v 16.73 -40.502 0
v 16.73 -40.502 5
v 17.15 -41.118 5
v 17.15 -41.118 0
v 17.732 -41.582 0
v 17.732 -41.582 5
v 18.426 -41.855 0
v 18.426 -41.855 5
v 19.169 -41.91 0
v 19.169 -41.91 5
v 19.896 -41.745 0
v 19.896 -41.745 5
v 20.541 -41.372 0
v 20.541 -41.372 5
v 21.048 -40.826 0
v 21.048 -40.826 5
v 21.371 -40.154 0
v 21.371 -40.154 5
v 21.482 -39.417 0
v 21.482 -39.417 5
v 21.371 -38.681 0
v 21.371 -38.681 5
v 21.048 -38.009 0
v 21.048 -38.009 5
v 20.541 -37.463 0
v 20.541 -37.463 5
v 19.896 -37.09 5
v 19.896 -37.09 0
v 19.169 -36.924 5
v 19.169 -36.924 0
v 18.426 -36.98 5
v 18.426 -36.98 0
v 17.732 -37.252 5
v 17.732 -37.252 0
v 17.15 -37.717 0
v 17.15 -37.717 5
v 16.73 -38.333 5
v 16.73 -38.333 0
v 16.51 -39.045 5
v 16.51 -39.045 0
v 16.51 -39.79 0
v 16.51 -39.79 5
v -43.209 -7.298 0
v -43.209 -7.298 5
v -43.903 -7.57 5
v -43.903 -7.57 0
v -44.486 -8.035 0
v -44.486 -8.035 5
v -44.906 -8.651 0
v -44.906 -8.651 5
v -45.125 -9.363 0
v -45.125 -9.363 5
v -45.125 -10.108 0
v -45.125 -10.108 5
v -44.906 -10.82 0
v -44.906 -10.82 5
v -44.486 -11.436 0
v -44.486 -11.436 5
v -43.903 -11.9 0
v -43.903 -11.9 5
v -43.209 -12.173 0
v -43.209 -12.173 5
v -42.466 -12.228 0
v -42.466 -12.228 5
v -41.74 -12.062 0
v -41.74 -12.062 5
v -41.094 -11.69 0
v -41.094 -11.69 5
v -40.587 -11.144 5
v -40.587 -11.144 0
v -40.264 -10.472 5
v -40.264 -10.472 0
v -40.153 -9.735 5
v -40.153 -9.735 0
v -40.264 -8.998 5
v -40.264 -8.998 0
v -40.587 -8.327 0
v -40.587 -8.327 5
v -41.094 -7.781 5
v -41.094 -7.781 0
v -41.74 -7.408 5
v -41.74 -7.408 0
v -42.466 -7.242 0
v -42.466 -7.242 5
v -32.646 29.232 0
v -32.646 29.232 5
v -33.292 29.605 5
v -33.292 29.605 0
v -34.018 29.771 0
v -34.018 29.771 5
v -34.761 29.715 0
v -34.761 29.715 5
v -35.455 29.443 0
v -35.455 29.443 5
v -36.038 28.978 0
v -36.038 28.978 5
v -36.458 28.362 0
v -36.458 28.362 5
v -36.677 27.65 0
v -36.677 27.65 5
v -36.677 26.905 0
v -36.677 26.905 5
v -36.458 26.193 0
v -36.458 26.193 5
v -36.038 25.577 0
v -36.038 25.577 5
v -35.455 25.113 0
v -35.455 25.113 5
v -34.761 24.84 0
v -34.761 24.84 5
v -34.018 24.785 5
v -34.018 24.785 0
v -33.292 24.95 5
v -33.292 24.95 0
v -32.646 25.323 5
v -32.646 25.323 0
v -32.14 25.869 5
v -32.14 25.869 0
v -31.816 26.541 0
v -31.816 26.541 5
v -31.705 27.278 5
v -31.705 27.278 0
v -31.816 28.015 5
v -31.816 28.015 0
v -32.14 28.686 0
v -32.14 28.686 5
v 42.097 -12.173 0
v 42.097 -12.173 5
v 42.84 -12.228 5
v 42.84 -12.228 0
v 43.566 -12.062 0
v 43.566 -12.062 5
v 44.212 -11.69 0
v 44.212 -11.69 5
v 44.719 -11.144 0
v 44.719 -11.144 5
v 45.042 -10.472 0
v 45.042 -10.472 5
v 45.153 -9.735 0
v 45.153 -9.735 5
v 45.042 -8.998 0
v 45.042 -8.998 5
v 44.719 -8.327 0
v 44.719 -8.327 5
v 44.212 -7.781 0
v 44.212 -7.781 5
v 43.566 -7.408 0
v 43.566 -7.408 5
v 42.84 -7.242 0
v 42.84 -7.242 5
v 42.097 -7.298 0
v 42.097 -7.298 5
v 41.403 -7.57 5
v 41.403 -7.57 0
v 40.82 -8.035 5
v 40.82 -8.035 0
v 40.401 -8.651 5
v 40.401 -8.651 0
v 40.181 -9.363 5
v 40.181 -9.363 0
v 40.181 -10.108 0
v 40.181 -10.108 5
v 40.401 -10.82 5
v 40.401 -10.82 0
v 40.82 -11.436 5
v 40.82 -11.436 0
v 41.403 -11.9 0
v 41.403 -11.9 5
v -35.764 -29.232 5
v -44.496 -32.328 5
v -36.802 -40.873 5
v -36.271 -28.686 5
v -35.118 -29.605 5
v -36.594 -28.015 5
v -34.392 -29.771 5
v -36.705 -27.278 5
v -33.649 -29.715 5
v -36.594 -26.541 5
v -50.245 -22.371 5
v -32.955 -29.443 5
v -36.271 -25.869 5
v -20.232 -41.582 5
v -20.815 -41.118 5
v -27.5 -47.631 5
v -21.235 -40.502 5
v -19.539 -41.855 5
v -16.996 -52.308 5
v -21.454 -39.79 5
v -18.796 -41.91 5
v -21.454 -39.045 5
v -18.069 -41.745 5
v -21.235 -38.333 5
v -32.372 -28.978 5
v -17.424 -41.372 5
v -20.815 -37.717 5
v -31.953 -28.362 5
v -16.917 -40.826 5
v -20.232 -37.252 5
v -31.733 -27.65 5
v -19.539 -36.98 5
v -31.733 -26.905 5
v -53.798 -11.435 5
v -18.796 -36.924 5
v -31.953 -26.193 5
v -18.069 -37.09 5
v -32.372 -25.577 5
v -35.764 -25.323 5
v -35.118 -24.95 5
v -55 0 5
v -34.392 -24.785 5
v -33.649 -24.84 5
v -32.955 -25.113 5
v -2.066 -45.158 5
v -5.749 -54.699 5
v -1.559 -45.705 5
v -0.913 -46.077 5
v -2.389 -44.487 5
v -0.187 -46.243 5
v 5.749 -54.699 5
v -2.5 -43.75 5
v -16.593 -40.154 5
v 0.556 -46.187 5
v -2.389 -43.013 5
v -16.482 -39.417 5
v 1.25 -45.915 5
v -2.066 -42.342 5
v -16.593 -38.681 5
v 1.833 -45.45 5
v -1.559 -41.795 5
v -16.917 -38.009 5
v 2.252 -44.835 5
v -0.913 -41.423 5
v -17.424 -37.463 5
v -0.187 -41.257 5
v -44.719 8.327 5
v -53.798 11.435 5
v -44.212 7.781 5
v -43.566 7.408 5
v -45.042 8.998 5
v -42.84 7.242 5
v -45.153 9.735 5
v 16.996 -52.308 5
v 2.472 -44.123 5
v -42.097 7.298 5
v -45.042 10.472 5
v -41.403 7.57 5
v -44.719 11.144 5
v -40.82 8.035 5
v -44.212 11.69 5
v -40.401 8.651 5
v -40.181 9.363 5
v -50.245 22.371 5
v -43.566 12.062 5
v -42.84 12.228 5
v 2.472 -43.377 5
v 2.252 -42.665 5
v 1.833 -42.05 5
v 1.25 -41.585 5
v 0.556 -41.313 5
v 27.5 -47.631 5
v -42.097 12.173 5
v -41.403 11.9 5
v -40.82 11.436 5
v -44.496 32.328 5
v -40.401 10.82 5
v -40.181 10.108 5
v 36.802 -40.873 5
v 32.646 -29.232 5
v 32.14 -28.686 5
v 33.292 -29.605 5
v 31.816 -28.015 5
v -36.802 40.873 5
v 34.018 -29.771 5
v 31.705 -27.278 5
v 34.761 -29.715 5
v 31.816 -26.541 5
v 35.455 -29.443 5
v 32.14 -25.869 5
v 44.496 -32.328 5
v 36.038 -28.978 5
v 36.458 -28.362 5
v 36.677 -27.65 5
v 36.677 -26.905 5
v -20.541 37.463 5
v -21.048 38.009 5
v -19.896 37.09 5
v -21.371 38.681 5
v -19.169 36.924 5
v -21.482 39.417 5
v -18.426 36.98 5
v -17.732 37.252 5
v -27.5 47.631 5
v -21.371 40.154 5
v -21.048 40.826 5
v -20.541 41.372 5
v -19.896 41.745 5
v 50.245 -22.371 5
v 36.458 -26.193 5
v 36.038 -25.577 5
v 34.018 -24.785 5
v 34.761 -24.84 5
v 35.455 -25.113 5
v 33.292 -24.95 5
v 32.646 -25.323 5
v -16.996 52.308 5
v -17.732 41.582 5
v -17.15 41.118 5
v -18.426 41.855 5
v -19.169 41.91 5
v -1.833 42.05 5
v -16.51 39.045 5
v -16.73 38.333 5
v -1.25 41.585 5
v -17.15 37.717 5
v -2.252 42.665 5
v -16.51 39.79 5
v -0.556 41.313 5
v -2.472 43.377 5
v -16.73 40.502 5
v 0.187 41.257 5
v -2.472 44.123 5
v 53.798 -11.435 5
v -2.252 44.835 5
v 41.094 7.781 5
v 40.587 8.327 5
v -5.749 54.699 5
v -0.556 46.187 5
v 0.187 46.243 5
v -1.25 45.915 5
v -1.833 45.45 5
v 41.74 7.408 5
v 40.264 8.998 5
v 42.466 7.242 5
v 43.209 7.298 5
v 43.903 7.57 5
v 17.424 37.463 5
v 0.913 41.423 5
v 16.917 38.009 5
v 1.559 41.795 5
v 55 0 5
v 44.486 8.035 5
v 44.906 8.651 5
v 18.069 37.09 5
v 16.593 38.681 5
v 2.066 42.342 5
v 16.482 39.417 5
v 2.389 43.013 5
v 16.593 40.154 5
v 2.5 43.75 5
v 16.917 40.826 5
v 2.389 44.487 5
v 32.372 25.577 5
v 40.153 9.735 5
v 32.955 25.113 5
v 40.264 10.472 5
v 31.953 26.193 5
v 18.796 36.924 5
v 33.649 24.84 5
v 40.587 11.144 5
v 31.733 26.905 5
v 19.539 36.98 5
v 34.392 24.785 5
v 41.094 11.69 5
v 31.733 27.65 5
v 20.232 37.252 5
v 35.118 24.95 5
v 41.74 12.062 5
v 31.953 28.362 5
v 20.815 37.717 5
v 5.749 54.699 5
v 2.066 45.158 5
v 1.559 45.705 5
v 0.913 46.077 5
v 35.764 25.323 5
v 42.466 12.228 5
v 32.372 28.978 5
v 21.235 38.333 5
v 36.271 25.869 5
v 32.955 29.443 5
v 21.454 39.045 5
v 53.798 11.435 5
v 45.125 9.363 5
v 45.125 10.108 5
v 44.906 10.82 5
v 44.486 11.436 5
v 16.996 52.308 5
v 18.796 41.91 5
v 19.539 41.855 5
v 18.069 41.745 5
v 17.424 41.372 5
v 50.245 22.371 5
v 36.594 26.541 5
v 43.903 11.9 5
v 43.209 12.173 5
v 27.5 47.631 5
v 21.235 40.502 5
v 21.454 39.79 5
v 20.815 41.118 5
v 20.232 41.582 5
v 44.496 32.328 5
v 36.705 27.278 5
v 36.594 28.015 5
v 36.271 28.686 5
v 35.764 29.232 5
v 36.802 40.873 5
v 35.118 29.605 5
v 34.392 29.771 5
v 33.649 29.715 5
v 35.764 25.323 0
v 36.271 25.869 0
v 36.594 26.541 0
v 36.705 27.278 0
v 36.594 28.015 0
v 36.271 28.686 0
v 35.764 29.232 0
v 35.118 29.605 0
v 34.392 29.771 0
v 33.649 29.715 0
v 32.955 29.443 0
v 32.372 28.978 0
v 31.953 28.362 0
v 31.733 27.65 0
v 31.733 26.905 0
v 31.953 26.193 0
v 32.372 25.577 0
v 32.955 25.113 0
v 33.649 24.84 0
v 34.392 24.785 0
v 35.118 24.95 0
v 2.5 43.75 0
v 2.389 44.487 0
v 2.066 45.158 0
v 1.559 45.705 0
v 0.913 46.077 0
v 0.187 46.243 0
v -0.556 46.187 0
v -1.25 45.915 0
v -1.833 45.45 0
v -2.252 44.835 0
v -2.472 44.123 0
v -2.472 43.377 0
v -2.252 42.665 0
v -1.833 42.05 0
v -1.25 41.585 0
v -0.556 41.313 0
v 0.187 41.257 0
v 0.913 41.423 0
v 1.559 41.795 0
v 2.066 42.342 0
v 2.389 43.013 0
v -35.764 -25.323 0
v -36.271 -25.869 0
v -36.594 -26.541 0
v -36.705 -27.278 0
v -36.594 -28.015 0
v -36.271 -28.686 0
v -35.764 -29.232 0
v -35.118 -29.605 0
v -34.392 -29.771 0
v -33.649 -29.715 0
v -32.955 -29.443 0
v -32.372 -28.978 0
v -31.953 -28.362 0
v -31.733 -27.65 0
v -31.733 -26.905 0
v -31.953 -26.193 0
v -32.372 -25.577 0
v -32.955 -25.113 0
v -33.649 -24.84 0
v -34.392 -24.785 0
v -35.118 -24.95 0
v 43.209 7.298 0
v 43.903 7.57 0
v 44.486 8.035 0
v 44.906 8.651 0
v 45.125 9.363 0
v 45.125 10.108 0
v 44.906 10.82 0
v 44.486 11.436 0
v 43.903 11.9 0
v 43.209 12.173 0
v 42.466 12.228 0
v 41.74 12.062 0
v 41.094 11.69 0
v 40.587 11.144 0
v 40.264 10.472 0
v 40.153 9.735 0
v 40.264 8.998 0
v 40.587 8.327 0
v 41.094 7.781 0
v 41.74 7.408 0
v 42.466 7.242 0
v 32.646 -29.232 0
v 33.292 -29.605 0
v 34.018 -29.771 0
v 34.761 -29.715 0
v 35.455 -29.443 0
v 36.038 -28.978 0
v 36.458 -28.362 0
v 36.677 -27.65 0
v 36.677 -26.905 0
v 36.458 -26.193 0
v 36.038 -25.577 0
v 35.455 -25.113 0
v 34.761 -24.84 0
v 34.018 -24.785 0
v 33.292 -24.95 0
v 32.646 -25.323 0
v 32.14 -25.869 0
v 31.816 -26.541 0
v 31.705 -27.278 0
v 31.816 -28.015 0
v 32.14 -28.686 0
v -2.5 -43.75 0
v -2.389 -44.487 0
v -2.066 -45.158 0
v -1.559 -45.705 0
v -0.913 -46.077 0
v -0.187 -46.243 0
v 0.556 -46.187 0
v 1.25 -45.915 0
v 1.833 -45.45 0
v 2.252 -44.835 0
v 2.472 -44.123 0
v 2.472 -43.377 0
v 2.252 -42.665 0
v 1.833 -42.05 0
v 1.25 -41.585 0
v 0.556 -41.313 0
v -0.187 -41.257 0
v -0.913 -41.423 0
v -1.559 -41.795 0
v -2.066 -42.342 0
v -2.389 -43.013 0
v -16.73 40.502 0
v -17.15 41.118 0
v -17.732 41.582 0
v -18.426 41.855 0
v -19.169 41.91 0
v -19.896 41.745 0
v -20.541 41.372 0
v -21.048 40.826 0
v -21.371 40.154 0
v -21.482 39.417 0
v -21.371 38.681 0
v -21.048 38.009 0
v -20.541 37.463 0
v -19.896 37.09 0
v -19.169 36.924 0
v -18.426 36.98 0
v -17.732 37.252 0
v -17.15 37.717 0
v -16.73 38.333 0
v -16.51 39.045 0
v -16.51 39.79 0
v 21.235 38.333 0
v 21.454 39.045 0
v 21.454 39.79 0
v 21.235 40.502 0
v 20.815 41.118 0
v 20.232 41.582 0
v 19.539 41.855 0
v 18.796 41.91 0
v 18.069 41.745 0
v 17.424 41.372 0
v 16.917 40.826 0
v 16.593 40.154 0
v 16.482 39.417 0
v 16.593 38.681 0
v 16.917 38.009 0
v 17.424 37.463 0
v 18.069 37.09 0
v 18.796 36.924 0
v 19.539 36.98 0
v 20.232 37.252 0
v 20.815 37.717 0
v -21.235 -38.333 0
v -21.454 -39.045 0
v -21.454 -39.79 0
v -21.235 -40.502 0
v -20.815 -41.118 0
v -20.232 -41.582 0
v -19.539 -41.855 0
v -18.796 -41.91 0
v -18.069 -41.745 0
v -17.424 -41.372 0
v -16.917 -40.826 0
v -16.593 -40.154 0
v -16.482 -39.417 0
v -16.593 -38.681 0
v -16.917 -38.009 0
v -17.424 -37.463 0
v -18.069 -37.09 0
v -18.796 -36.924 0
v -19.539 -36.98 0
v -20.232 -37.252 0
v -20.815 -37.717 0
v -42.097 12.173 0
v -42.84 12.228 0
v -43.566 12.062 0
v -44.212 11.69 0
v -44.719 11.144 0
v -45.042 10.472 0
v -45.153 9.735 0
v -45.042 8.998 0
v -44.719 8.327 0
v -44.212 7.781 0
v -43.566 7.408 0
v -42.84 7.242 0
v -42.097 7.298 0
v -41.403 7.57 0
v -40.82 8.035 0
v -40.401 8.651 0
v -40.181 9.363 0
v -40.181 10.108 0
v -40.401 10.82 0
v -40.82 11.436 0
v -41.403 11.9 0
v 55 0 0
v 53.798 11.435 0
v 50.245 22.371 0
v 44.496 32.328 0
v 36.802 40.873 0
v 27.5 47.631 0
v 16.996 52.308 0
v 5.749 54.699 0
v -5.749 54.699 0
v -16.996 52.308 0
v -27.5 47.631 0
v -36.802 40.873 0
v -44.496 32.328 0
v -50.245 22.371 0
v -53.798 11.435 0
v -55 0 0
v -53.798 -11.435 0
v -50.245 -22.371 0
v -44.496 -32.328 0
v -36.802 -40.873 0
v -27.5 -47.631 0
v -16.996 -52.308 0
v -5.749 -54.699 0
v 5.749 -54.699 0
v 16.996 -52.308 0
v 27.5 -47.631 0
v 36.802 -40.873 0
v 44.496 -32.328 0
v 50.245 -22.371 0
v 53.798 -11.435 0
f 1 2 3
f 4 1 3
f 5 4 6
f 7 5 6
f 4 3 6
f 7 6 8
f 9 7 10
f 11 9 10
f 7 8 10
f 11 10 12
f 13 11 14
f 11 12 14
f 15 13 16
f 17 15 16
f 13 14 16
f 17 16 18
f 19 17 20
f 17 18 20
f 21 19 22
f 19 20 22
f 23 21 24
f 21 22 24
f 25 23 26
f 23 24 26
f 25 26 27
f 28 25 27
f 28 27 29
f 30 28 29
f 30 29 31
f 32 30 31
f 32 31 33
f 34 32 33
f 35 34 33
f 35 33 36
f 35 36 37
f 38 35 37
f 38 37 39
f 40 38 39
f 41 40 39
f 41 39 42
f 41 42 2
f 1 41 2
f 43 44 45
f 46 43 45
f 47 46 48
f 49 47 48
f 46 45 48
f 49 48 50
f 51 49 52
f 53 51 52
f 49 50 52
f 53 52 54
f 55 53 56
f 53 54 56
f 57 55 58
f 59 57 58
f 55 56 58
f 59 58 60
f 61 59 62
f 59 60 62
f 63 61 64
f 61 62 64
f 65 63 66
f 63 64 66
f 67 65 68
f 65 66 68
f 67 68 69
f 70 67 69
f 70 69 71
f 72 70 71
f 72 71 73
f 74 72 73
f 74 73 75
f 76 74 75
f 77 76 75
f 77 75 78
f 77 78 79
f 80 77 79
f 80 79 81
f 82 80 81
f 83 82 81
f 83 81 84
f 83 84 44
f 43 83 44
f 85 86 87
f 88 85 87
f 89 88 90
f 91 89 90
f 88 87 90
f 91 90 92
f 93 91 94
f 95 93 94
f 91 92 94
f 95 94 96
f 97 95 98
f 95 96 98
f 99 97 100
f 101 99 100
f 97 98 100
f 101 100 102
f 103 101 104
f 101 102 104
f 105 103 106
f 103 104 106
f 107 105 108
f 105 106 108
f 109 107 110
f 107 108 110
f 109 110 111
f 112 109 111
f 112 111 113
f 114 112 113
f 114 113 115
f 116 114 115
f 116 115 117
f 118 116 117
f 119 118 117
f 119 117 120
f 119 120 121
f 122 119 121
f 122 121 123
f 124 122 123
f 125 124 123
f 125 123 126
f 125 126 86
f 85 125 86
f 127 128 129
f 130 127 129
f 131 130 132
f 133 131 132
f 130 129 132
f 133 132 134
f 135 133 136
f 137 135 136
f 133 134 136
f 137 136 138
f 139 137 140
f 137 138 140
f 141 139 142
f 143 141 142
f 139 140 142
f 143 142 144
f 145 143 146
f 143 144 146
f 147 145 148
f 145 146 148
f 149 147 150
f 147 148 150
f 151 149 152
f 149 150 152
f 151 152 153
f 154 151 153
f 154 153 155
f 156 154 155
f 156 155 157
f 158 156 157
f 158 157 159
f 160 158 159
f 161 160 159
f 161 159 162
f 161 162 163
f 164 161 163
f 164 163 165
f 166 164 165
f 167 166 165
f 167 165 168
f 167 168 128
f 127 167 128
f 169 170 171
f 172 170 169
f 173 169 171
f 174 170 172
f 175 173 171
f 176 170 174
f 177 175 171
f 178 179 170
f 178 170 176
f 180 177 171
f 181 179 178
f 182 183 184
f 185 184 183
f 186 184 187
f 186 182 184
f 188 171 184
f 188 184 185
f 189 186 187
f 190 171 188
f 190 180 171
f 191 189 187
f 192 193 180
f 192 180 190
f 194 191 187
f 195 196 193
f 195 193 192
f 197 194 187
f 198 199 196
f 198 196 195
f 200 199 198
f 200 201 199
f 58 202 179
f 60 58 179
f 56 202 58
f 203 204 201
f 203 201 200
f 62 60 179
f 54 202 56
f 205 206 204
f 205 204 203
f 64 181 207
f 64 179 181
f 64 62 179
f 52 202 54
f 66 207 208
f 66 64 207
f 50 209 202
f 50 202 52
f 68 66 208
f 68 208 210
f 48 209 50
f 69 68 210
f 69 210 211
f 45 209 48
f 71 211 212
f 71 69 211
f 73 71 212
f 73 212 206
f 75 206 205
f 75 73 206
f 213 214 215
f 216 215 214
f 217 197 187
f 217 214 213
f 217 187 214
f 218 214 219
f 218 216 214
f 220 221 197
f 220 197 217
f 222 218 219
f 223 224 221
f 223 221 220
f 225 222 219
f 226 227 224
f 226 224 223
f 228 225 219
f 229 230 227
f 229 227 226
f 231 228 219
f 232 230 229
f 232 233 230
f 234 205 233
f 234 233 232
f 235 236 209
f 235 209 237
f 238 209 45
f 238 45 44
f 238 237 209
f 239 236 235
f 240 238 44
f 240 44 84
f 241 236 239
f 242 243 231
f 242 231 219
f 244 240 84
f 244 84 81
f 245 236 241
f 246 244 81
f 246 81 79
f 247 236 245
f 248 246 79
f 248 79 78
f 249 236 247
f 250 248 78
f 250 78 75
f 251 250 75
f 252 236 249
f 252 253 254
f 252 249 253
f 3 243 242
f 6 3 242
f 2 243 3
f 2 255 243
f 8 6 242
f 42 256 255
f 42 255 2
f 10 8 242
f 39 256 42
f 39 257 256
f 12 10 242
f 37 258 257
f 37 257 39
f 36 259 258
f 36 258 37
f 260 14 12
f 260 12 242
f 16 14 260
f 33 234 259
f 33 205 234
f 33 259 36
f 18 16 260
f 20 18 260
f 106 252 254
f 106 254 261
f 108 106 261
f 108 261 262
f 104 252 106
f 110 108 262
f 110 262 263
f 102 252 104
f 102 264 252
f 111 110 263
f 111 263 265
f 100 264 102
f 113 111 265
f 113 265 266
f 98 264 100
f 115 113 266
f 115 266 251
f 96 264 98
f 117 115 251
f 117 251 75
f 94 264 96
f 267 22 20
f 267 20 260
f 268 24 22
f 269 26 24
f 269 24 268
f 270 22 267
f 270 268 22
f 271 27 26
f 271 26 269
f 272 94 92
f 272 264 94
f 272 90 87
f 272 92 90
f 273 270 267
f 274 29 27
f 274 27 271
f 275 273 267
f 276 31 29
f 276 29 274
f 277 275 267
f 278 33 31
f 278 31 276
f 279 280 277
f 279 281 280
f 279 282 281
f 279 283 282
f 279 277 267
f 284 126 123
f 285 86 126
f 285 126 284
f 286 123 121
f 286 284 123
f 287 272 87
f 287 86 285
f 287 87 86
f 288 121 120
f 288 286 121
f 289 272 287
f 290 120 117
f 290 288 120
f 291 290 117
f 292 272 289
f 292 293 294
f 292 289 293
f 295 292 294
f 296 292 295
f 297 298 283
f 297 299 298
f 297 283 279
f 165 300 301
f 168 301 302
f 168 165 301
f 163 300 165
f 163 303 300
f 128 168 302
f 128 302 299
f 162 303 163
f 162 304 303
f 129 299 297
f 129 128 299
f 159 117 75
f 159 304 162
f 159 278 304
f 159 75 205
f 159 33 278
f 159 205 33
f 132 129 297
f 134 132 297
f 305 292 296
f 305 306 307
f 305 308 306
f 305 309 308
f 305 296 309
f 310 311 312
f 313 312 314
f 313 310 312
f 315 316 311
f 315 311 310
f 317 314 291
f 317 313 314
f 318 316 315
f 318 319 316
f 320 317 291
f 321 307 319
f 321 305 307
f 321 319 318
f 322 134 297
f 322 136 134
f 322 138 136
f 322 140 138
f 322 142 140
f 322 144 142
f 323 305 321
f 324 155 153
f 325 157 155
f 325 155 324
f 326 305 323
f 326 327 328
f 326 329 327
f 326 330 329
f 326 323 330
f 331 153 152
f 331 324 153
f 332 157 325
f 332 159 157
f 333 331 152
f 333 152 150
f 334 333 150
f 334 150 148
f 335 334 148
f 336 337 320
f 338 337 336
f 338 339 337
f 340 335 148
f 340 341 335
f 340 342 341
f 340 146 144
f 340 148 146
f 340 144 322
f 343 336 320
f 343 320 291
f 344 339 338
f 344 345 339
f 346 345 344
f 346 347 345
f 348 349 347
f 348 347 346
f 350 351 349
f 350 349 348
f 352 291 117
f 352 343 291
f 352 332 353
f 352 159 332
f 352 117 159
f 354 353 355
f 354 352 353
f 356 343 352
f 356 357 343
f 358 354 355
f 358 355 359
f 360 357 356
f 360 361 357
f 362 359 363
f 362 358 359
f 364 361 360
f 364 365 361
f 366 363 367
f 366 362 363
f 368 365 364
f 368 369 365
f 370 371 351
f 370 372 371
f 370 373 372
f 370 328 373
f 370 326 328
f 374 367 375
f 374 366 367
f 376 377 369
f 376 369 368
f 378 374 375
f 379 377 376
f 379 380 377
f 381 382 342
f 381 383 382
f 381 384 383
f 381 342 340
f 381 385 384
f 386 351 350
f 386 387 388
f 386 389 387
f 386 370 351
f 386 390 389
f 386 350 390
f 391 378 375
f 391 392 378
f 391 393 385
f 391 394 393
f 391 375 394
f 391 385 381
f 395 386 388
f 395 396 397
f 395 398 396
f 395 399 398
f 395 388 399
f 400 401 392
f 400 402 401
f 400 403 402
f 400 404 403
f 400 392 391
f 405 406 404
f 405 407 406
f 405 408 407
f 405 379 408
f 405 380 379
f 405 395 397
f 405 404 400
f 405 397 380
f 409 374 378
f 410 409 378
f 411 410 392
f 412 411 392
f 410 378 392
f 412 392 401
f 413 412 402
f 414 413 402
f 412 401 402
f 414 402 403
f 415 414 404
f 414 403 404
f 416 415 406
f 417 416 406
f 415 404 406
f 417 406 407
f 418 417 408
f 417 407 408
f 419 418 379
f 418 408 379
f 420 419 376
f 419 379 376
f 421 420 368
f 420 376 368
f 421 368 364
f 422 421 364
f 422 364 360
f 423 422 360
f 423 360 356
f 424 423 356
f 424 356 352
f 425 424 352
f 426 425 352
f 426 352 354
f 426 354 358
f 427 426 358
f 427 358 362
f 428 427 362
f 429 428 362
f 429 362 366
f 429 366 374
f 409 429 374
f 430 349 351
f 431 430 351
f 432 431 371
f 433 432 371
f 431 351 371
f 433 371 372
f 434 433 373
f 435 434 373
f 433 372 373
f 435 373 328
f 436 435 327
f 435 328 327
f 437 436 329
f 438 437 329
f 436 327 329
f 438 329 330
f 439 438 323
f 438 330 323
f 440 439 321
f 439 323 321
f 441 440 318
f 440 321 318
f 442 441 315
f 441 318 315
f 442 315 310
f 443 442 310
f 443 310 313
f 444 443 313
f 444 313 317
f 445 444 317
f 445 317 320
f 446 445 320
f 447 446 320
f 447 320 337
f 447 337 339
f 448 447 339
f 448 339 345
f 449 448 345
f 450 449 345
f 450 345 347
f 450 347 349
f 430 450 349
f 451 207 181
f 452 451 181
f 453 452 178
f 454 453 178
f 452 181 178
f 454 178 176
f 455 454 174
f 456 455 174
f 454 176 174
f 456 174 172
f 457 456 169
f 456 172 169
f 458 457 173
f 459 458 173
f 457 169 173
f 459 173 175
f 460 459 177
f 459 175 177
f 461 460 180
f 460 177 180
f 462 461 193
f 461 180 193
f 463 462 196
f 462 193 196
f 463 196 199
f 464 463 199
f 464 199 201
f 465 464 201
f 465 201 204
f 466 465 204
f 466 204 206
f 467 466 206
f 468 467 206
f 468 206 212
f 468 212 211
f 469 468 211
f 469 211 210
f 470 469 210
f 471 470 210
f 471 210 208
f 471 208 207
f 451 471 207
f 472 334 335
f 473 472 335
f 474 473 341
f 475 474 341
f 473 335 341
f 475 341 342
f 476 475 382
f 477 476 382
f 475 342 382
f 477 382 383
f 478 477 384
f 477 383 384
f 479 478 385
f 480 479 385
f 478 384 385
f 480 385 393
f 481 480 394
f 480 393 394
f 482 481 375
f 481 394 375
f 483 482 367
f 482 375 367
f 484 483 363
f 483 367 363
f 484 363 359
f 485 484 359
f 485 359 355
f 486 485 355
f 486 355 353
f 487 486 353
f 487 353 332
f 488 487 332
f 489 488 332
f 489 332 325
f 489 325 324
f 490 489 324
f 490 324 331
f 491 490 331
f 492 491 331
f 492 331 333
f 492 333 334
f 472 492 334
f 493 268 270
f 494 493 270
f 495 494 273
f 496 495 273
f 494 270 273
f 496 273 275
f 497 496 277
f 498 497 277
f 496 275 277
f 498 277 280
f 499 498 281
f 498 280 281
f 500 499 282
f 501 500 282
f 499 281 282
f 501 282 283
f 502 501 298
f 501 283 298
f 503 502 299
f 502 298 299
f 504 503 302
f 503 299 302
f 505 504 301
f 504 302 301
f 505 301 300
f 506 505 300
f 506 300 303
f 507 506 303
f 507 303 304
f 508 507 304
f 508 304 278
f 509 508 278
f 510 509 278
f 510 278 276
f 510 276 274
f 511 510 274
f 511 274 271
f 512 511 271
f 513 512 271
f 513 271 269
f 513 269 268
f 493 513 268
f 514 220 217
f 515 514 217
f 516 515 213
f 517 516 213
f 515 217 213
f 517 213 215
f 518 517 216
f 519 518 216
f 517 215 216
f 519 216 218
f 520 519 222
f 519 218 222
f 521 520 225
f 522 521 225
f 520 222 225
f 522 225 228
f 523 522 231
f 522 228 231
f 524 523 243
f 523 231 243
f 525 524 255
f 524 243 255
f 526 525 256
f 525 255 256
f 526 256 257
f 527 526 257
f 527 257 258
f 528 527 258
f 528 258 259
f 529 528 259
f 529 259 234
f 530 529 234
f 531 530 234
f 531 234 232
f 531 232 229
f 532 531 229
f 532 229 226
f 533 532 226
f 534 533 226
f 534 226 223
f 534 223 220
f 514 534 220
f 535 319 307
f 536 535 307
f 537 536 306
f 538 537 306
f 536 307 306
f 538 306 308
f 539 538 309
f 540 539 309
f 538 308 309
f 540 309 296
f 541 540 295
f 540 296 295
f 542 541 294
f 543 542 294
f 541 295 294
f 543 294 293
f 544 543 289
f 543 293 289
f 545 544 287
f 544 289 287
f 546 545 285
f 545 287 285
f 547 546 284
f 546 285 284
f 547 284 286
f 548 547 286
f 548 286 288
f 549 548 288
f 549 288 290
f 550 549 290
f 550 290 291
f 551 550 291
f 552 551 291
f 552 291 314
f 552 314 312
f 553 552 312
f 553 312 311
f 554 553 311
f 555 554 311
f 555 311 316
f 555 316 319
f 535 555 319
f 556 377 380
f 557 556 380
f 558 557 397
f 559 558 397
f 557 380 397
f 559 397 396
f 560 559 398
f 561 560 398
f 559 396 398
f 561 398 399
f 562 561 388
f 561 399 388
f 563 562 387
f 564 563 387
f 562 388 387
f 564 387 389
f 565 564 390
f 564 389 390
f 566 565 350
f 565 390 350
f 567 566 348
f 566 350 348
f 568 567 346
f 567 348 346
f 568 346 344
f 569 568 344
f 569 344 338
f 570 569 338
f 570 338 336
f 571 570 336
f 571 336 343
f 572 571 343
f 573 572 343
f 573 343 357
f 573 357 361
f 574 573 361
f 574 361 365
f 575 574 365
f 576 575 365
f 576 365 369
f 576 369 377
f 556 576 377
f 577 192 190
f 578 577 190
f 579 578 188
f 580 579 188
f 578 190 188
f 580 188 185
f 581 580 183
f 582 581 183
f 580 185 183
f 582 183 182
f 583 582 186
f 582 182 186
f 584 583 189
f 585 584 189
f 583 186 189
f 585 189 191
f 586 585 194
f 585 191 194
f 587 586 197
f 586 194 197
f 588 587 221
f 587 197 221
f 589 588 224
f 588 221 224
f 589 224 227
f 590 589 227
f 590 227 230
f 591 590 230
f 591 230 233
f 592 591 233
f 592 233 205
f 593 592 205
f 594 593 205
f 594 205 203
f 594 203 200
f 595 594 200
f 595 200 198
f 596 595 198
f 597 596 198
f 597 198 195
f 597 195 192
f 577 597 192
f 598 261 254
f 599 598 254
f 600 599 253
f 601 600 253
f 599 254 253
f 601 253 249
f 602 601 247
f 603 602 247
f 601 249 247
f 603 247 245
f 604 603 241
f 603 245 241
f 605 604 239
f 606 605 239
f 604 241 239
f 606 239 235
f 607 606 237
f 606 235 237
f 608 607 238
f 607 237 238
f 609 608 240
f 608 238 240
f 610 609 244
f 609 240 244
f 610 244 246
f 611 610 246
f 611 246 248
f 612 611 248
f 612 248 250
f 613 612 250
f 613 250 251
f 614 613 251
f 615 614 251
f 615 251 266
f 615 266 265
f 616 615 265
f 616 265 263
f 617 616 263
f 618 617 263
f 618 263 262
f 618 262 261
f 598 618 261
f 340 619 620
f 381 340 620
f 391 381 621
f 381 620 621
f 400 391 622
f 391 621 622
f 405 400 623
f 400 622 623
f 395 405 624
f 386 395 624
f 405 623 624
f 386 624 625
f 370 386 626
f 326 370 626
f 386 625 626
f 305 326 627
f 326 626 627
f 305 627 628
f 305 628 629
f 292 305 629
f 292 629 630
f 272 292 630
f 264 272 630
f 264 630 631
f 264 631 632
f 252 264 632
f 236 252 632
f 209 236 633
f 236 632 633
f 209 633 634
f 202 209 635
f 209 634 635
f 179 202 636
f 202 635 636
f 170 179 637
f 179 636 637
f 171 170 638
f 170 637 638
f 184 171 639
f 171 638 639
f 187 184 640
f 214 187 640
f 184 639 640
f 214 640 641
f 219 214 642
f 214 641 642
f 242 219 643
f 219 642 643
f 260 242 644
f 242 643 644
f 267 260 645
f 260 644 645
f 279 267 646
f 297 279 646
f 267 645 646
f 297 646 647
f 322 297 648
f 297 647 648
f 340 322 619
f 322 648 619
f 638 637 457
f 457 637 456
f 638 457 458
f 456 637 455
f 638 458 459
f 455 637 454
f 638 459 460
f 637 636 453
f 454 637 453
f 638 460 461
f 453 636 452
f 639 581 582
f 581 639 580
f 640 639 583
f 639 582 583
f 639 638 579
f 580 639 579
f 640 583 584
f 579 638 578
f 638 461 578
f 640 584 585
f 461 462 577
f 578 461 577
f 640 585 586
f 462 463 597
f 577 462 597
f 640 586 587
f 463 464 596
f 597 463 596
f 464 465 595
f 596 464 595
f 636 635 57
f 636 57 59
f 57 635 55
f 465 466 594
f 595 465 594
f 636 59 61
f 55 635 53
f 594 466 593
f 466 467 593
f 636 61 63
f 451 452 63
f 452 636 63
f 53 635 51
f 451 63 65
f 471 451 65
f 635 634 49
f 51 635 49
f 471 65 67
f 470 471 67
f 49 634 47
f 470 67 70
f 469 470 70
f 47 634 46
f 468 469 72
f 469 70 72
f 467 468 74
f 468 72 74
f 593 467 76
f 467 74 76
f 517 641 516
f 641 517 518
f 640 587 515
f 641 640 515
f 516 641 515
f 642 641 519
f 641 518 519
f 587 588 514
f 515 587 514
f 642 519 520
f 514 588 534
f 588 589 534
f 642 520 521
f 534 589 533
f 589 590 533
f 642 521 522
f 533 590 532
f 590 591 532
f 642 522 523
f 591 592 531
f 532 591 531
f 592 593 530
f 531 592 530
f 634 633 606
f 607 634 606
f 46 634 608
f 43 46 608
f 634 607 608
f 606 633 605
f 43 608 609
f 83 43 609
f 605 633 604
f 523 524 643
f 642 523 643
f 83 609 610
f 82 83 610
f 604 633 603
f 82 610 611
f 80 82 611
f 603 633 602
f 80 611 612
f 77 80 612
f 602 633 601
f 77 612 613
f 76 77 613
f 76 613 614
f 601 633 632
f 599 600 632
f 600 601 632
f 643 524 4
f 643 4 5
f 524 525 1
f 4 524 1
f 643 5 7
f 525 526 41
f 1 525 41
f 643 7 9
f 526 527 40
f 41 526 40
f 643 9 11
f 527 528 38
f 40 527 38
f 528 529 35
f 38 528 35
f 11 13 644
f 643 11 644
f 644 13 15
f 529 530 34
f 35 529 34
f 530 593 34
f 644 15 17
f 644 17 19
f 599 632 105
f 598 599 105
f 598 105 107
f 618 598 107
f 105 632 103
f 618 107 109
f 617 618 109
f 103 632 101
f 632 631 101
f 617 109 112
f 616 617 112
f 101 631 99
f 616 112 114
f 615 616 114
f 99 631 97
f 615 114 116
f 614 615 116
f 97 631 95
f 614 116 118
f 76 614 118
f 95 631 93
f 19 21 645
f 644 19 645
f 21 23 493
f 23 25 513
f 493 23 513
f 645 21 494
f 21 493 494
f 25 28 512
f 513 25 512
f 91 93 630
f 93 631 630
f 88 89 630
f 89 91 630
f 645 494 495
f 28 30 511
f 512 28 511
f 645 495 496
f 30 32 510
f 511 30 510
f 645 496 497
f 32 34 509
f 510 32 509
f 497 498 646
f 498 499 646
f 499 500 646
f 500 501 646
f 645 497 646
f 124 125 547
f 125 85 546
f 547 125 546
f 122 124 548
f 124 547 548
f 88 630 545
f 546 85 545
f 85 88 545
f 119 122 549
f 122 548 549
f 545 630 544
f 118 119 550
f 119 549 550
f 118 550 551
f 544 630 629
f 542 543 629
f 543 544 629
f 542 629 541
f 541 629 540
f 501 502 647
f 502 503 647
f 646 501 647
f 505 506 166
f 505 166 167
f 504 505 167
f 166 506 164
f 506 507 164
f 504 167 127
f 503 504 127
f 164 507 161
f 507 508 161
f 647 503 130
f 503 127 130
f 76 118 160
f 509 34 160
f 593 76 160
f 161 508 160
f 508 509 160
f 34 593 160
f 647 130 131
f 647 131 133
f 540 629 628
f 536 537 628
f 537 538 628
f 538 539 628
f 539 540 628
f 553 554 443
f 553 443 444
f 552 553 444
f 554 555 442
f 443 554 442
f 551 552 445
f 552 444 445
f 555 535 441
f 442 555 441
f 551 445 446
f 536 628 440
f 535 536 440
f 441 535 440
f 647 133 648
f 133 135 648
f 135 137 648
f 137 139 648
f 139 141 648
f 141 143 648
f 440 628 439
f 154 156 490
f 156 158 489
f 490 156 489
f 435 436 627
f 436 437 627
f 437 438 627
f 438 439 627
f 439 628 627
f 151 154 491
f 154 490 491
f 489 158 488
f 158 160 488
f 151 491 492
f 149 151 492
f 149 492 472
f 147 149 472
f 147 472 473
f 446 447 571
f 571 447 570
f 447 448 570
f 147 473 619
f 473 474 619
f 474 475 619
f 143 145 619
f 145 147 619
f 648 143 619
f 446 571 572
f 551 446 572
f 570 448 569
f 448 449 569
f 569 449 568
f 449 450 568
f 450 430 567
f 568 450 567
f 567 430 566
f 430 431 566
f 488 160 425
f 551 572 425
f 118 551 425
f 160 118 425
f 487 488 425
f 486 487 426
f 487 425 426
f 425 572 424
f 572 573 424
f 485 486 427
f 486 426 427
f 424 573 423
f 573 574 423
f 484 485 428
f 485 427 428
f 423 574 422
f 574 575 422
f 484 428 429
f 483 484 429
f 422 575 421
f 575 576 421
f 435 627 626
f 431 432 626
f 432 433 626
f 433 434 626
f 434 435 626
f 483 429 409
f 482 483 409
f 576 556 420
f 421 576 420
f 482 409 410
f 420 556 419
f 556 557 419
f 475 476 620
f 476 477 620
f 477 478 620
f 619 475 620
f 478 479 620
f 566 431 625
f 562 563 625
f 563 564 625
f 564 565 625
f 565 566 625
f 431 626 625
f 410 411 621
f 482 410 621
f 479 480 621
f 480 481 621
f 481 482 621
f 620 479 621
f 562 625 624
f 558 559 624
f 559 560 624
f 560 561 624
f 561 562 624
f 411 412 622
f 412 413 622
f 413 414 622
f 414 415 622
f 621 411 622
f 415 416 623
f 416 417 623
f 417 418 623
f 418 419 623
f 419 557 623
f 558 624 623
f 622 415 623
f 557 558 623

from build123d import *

# Parameters (mm, degrees)
F0_R            = 55
F1_DEPTH        = 5
F2_R            = 2.5
F3_DEPTH        = 5.001
F3_COPIES_COUNT = 14


# Not quite as in the source:
# - a pattern or mirror of a feature is missing from the dataset's text; its kind, count and spacing are read off the source's solid


with BuildPart() as f1:
    # F0 (on Top) → F1 (new body)
    with BuildSketch(Plane.XY):
        Circle(F0_R)
    extrude(amount=F1_DEPTH)

    # F2 (on face) → F3 (cut, through all)
    with BuildSketch(Plane.XY.offset(5)):
        with Locations((0, 43.75)):
            Circle(F2_R)
    f3 = extrude(amount=-F3_DEPTH, mode=Mode.SUBTRACT)

    # F3_copies: F3 ×14 about axis
    f3_copies_axis = Axis((0, 0, 0), (0, 0, 1))
    for i in range(1, F3_COPIES_COUNT):
        add(f3.rotate(f3_copies_axis, i * 360 / F3_COPIES_COUNT), mode=Mode.SUBTRACT)


solid = f1.part
